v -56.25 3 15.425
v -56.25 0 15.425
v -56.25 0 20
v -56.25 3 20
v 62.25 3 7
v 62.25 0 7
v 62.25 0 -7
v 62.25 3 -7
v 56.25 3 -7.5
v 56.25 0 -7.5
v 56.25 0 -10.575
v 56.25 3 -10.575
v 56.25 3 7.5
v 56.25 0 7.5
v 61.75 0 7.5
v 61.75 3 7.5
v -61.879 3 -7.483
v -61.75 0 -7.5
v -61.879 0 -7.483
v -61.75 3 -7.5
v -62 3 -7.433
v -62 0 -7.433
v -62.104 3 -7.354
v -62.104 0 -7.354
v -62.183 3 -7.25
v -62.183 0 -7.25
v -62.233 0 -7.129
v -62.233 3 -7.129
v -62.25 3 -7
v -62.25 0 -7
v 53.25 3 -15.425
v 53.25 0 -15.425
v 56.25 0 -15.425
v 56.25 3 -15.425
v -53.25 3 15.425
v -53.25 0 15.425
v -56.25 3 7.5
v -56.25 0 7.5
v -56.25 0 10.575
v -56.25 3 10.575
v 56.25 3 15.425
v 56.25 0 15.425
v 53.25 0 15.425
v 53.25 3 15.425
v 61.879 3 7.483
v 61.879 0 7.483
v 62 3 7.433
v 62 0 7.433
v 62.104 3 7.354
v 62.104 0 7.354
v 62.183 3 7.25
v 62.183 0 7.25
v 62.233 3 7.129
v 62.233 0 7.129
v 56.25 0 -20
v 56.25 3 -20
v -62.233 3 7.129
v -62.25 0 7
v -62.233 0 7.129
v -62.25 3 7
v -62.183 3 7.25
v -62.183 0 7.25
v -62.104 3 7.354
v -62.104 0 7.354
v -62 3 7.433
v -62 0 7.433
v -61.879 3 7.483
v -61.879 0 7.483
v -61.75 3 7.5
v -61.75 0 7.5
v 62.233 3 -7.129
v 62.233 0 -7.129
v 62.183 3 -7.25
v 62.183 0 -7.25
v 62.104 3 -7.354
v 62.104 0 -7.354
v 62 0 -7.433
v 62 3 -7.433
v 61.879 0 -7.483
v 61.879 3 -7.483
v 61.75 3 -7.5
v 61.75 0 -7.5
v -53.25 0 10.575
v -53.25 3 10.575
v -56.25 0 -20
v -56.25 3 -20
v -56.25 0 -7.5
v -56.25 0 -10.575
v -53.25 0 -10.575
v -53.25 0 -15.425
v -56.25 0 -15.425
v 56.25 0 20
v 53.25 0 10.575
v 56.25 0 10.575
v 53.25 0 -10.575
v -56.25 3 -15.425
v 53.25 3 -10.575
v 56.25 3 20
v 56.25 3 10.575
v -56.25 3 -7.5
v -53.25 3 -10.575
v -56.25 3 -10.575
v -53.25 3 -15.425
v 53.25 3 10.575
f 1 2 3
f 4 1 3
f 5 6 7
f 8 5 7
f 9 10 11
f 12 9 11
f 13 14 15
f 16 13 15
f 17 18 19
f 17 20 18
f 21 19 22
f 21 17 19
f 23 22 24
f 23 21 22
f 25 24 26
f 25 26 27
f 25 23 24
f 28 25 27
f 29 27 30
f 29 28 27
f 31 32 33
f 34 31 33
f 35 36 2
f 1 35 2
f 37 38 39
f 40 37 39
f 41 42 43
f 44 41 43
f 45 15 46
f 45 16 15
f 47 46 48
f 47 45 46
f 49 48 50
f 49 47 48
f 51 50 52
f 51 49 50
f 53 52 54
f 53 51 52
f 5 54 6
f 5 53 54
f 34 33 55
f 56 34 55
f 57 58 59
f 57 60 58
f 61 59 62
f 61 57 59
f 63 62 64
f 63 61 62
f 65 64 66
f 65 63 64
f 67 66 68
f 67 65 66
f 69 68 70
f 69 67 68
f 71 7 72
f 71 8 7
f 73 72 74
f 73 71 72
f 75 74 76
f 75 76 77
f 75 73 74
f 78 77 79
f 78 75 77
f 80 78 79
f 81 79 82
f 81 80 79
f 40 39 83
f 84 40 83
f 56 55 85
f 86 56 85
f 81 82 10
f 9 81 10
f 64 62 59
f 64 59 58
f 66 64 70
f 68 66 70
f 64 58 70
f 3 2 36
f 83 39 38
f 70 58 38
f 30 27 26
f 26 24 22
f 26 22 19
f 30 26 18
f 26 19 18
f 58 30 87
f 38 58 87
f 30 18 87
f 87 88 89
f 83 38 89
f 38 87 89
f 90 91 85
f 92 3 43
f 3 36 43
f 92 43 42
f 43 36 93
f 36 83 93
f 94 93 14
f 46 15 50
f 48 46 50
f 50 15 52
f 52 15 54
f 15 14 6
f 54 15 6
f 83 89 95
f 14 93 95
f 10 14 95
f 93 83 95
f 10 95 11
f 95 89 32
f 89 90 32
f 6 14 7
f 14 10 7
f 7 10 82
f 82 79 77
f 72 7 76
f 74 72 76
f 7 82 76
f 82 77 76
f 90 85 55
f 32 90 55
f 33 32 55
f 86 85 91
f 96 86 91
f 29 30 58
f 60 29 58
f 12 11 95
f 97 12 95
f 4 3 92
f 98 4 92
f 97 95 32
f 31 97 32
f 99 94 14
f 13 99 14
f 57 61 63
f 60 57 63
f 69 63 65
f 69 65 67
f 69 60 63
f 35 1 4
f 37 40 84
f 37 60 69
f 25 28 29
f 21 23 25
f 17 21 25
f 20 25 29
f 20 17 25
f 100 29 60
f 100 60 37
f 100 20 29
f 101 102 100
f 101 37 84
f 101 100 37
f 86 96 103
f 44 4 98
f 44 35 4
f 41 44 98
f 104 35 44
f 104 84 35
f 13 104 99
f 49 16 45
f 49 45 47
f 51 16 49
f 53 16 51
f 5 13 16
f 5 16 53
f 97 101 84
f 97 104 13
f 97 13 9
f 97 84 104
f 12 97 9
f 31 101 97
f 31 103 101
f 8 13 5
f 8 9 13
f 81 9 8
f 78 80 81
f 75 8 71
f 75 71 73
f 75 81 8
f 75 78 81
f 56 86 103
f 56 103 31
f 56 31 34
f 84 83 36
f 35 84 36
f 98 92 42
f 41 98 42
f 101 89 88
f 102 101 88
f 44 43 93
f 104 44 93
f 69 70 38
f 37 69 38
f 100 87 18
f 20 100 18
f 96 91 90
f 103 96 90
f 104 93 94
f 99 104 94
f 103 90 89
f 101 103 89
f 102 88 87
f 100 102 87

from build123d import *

# Parameters (mm, degrees)
EXTRUDE_1_DEPTH = 3
FILLET_1_R      = 0.5


with BuildPart() as part:
    # Эскиз1 → Бобышка-Вытянуть1 (new body)
    with BuildSketch(Plane(origin=(0, 0, 0), x_dir=(1, 0, 0), z_dir=(0, 1, 0))):
        Polygon((56.25, 20), (-56.25, 20), (-56.25, 15.425), (-53.25, 15.425), (-53.25, 10.575), (-56.25, 10.575), (-56.25, 7.5), (-62.25, 7.5), (-62.25, -7.5), (-56.25, -7.5), (-56.25, -10.575), (-53.25, -10.575), (-53.25, -15.425), (-56.25, -15.425), (-56.25, -20), (56.25, -20), (56.25, -15.425), (53.25, -15.425), (53.25, -10.575), (56.25, -10.575), (56.25, -7.5), (62.25, -7.5), (62.25, 7.5), (56.25, 7.5), (56.25, 10.575), (53.25, 10.575), (53.25, 15.425), (56.25, 15.425), align=None)
    extrude(amount=EXTRUDE_1_DEPTH)

    # Скругление1
    fillet_1_edges = [part.edges().sort_by_distance(p)[0] for p in [
        (-62.25, 1.5, 7.5),
        (-62.25, 1.5, -7.5),
        (62.25, 1.5, -7.5),
        (62.25, 1.5, 7.5),
    ]]
    fillet(fillet_1_edges, radius=FILLET_1_R)


solid = part.part
